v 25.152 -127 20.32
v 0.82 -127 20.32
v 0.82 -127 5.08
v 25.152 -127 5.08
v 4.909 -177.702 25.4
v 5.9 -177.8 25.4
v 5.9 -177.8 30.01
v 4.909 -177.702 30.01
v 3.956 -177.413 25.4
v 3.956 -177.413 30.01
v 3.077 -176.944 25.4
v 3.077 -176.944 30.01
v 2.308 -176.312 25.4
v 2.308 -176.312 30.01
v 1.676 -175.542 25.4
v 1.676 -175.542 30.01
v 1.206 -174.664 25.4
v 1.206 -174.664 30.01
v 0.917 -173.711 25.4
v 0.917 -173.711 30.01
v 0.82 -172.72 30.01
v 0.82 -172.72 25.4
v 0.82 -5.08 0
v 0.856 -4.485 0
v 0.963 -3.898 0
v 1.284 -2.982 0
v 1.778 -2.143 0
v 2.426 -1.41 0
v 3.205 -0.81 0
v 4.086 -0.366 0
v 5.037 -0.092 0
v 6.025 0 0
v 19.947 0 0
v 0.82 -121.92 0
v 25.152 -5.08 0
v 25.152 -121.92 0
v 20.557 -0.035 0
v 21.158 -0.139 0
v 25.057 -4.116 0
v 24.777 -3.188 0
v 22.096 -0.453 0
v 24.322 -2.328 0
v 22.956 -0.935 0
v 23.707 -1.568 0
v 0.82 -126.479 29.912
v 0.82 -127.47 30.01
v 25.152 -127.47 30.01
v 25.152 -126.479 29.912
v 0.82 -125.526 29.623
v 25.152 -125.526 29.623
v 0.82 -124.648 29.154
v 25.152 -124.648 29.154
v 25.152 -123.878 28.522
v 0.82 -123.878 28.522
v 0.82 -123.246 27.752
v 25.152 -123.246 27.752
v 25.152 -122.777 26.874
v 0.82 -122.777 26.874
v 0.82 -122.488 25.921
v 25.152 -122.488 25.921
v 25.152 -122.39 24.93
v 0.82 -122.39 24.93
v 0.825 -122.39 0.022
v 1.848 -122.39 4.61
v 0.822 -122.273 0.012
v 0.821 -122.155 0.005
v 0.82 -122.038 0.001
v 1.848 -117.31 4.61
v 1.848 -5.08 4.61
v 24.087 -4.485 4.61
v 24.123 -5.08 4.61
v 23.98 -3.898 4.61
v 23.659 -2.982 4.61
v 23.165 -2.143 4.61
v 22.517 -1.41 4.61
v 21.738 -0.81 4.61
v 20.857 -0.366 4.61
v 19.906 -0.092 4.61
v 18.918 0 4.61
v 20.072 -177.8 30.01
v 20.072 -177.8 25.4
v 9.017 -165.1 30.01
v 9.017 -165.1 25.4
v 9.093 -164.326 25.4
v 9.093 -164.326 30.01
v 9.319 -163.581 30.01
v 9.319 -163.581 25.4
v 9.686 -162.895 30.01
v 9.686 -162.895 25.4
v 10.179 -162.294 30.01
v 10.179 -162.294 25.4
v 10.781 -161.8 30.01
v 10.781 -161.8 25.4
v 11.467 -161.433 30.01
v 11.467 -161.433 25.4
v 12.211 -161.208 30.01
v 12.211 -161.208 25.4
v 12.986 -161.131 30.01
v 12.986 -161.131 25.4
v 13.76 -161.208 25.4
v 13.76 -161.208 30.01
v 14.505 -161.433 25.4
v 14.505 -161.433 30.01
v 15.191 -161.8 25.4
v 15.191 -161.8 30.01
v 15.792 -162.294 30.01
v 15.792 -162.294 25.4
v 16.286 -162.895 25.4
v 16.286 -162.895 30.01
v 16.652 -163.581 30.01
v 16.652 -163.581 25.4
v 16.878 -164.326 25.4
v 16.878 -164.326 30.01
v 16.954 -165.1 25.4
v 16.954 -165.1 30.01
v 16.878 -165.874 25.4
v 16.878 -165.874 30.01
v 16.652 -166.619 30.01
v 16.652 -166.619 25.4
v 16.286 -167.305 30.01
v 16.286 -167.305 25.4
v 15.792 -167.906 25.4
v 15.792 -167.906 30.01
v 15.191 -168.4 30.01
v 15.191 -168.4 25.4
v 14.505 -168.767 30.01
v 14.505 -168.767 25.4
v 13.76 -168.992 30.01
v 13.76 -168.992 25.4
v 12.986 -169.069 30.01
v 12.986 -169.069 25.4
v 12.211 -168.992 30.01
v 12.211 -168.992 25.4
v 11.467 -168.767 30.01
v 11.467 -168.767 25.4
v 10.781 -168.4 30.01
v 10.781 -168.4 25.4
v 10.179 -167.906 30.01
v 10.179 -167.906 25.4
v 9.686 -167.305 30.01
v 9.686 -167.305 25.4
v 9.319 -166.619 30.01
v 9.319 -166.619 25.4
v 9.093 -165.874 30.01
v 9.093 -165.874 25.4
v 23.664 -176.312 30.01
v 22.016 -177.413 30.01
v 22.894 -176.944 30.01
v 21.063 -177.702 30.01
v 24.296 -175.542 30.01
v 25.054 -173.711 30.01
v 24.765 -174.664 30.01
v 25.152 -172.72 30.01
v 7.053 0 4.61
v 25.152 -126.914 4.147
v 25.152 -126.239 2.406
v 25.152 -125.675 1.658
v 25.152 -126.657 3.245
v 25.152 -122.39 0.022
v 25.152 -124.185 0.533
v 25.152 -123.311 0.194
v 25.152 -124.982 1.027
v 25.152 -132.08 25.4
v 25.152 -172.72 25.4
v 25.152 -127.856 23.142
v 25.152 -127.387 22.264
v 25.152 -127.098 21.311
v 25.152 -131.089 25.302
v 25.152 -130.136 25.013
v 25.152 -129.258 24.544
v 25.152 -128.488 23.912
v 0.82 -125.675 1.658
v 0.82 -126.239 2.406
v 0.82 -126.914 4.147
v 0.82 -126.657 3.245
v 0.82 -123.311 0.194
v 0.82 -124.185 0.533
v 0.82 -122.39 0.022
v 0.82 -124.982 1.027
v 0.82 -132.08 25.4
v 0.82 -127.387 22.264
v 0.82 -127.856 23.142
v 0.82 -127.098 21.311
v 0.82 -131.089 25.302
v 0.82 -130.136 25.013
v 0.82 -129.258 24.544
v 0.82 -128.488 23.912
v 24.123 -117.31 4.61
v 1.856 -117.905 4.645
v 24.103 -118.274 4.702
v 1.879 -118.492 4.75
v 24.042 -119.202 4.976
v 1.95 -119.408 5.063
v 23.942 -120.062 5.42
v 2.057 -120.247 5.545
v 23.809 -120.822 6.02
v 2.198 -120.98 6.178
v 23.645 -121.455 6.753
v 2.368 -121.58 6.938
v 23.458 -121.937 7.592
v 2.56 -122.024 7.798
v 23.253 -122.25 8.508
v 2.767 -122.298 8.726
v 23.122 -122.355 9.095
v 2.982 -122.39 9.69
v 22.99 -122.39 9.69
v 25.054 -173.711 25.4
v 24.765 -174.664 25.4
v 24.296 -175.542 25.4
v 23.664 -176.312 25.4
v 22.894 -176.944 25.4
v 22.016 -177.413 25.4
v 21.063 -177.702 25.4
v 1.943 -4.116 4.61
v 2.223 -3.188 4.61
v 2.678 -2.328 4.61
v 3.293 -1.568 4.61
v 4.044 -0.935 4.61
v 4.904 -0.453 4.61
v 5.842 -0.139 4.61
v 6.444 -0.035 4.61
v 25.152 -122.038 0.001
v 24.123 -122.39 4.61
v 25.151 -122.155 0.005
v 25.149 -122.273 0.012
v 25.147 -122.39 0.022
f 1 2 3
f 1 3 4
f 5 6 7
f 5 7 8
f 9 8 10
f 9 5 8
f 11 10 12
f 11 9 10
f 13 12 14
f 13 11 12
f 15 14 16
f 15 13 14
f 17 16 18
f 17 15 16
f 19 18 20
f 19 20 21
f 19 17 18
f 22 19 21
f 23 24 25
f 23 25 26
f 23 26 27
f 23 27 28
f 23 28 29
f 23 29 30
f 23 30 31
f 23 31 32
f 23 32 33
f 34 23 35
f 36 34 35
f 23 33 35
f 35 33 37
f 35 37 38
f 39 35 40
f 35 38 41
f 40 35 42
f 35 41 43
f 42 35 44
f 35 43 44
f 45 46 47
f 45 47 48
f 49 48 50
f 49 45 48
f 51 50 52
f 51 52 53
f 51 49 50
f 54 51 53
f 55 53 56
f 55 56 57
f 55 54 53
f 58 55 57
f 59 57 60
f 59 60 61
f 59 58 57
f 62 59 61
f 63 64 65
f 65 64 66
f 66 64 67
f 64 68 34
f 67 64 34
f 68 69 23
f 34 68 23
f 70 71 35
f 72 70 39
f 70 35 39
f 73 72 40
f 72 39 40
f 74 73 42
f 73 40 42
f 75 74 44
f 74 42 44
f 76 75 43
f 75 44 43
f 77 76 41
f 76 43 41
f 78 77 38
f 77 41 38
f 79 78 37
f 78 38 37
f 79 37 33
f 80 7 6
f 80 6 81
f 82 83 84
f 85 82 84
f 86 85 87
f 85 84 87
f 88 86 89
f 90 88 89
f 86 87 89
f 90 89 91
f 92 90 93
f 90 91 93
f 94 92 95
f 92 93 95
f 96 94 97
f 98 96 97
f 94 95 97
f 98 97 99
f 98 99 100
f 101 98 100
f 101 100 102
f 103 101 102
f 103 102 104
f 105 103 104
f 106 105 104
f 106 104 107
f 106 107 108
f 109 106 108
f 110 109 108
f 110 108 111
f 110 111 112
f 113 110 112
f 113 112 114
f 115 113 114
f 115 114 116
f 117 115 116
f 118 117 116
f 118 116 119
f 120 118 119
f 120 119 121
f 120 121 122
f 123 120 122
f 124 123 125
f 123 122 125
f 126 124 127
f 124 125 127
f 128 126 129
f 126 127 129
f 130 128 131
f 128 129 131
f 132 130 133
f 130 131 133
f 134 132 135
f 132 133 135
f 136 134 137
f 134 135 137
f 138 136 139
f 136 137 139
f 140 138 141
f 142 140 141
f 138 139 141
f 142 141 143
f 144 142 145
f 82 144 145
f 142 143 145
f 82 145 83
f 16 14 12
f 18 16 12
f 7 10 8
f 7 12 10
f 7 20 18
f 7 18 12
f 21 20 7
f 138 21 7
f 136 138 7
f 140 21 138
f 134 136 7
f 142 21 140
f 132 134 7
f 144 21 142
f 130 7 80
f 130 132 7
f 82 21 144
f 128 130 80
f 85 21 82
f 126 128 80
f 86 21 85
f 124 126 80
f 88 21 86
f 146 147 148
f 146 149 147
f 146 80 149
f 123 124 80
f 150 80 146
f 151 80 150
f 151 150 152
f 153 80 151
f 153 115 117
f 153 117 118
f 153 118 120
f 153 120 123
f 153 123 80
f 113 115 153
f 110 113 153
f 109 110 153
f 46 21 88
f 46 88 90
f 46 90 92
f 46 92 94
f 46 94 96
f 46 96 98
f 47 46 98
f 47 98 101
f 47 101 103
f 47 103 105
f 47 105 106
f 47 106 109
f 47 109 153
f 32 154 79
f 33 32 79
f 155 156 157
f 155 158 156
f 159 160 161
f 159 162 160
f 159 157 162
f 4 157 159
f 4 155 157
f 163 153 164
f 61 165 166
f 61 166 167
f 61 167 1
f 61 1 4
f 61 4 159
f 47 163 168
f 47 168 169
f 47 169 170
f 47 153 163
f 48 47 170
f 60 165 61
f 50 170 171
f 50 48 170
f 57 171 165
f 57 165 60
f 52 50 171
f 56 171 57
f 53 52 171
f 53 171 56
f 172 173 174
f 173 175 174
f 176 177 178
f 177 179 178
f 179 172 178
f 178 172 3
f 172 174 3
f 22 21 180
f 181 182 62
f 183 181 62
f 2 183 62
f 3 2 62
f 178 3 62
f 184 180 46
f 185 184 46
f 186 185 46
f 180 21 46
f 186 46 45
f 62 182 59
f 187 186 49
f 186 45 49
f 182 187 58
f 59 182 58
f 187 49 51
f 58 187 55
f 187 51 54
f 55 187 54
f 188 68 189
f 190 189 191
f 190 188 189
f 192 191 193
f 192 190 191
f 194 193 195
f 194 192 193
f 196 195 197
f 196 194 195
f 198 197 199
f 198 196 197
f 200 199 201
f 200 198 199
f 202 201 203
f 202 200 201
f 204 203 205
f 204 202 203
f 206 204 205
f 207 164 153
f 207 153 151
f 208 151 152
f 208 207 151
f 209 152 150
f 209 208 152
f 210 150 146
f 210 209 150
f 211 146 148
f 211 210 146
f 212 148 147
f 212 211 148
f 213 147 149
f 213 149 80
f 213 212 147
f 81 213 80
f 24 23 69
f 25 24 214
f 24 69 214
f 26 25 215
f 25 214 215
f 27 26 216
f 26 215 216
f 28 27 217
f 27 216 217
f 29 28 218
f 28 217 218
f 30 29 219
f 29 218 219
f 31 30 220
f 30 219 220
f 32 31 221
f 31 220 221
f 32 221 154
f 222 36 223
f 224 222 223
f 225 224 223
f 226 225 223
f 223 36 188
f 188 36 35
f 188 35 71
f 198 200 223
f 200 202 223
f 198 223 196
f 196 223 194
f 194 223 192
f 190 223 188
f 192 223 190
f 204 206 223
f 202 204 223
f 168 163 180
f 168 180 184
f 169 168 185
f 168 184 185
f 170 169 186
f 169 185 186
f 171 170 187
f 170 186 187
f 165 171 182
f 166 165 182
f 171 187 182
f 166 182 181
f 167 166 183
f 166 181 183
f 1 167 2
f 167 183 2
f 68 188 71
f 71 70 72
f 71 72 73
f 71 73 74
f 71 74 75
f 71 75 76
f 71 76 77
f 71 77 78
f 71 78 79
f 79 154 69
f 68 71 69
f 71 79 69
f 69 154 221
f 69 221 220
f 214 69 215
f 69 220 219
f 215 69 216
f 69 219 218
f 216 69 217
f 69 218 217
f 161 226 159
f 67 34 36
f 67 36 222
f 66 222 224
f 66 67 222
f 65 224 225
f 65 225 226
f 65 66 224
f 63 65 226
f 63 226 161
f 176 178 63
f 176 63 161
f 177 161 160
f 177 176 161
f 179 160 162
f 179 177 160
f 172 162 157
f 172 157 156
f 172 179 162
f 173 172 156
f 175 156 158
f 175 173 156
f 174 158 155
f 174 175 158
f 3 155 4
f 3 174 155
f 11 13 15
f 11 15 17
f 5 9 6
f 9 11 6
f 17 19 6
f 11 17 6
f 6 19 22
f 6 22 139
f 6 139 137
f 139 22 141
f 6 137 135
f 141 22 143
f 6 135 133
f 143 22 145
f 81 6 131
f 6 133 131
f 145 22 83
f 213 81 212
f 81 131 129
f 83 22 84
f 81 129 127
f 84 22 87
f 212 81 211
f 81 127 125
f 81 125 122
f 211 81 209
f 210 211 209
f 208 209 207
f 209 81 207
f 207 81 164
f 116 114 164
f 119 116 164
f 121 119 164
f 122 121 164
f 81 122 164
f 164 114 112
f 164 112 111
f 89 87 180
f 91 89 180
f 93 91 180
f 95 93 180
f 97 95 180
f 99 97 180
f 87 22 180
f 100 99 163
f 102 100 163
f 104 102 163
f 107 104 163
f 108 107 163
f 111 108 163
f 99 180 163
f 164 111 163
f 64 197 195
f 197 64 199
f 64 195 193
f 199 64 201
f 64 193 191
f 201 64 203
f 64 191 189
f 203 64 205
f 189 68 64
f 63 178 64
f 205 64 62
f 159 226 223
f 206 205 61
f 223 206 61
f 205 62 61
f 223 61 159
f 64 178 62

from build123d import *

# Parameters (mm, degrees)
F1_DEPTH      = 127
F2_W          = 24.3321505244
F2_H          = 4.6101
F3_DEPTH      = 25.4
F3_DEPTH_BACK = 4.6101
F4_W          = 24.3321505244
F4_H          = 4.6101
F5_DEPTH      = 50.8
F6_T1_DEPTH   = 24.3321505244
F6_T6_DEPTH   = 47.6747505244
F6_T9_DEPTH   = 49.7321505244
F6_T11_DEPTH  = 30.0101
F6_T13_DEPTH  = 30.1234781359
F6_T15_DEPTH  = 30.1234781359
F8_D          = 7.9375
F8_DEPTH      = 19.05
F8_TIP        = 2.3846655818


# Not quite as in the source:
# - a fillet or chamfer that OpenCascade refuses, or shapes differently, is made with other operations: its cross-section is extruded or revolved along the edge and cut away or added


with BuildPart() as f1:
    # F0 (on Front) → F1 (new body)
    with BuildSketch(Plane.XZ):
        Polygon((1.8483747378, 4.6101), (0.8196747378, 0), (25.1518252622, 0), (24.1231252622, 4.6101), align=None)
    extrude(amount=F1_DEPTH)

    # F2 (on face) → F3 (join, two sides)
    with BuildSketch(Plane.XY.offset(4.6101)) as f3_sk:
        with Locations((12.98575, -124.69495)):
            Rectangle(F2_W, F2_H)
    extrude(amount=F3_DEPTH)
    extrude(f3_sk.sketch, amount=-F3_DEPTH_BACK)

    # F4 (on face) → F5 (join)
    with BuildSketch(Plane.XZ.offset(127)):
        with Locations((12.98575, 27.70505)):
            Rectangle(F4_W, F4_H)
    extrude(amount=F5_DEPTH)

    # F6: fillet of radius 5.08 on 8 edges, made by hand

    # F6_s2 → F6_t1 (join)
    with BuildSketch(Plane.YZ.offset(0.8196747378)):
        with BuildLine():
            ThreePointArc((-132.08, 25.4), (-128.4878975516, 23.9121024484), (-127, 20.32))
            Line((-127, 20.32), (-127, 25.4))
            Line((-127, 25.4), (-132.08, 25.4))
        make_face()
    extrude(amount=F6_T1_DEPTH)


with BuildPart() as f6_tool4:
    # F6_s5 → F6_t6 (new body)
    with BuildSketch(Plane.YZ.offset(36.8231252622)):
        with BuildLine():
            ThreePointArc((-117.3099, 4.6101), (-120.9020024484, 6.0979975516), (-122.3899, 9.6901))
            Line((-122.3899, 9.6901), (-122.3899, 4.6101))
            Line((-122.3899, 4.6101), (-117.3099, 4.6101))
        make_face()
    extrude(amount=-F6_T6_DEPTH)

    split(bisect_by=Plane(origin=(0.780797517, 0, -0.1742275451), x_dir=(0, 1, 0), z_dir=(0.9759968962, 0, -0.2177844314)), keep=Keep.TOP)

    split(bisect_by=Plane(origin=(23.9588727172, 0, 5.3461947386), x_dir=(0, 1, 0), z_dir=(-0.9759968962, 0, -0.2177844314)), keep=Keep.TOP)


with BuildPart() as f1_1:
    add(f1.part)

    # F6_t3: union F6_tool4
    add(f6_tool4.part)

    # F6_s10 → F6_t9 (cut)
    with BuildSketch(Plane.YZ.offset(-11.8803252622)):
        with BuildLine():
            ThreePointArc((-127.4699, 30.0101), (-123.8777975516, 28.5222024484), (-122.3899, 24.9301))
            Line((-122.3899, 24.9301), (-122.3899, 30.0101))
            Line((-122.3899, 30.0101), (-127.4699, 30.0101))
        make_face()
        with BuildLine():
            ThreePointArc((-121.92, 0), (-125.5121024484, 1.4878975516), (-127, 5.08))
            Line((-127, 5.08), (-127, 0))
            Line((-127, 0), (-121.92, 0))
        make_face()
    extrude(amount=F6_T9_DEPTH, mode=Mode.SUBTRACT)

    # F6_s12 → F6_t11 (cut)
    with BuildSketch(Plane.XY.offset(12.7)):
        with BuildLine():
            ThreePointArc((5.8996747378, -177.8), (2.3075722894, -176.3121024484), (0.8196747378, -172.72))
            Line((0.8196747378, -172.72), (0.8196747378, -177.8))
            Line((0.8196747378, -177.8), (5.8996747378, -177.8))
        make_face()
        with BuildLine():
            ThreePointArc((25.1518252622, -172.72), (23.6639277106, -176.3121024484), (20.0718252622, -177.8))
            Line((20.0718252622, -177.8), (25.1518252622, -177.8))
            Line((25.1518252622, -177.8), (25.1518252622, -172.72))
        make_face()
    extrude(amount=F6_T11_DEPTH, mode=Mode.SUBTRACT)

    # F6_s14 → F6_t13 (cut)
    with BuildSketch(Plane(origin=(3.8334394995, 0, 17.1794881272), x_dir=(0, 1, 0), z_dir=(-0.2177844314, 0, -0.9759968962))):
        with BuildLine():
            ThreePointArc((-5.08, 0.8), (-1.4878975516, 2.2878975516), (0, 5.88))
            Line((0, 5.88), (0, 0.8))
            Line((0, 0.8), (-5.08, 0.8))
        make_face()
    extrude(amount=F6_T13_DEPTH, mode=Mode.SUBTRACT)

    # F6_s16 → F6_t15 (cut)
    with BuildSketch(Plane(origin=(3.9588148236, 0, -17.7413553206), x_dir=(0, 1, 0), z_dir=(-0.2177844314, 0, 0.9759968962))):
        with BuildLine():
            ThreePointArc((-5.08, -24.5481033904), (-1.4878975516, -23.0602058388), (0, -19.4681033904))
            Line((0, -19.4681033904), (0, -24.5481033904))
            Line((0, -24.5481033904), (-5.08, -24.5481033904))
        make_face()
    extrude(amount=F6_T15_DEPTH, mode=Mode.SUBTRACT)

    # F8
    with Locations(Plane.XY.offset(30.0101)):
        with Locations((12.98575, -165.1)):
            Hole(F8_D / 2, depth=F8_DEPTH)
            with Locations((0, 0, -(F8_DEPTH + F8_TIP / 2))):  # 118° drill point
                Cone(0, F8_D / 2, F8_TIP, mode=Mode.SUBTRACT)


solid = f1_1.part
